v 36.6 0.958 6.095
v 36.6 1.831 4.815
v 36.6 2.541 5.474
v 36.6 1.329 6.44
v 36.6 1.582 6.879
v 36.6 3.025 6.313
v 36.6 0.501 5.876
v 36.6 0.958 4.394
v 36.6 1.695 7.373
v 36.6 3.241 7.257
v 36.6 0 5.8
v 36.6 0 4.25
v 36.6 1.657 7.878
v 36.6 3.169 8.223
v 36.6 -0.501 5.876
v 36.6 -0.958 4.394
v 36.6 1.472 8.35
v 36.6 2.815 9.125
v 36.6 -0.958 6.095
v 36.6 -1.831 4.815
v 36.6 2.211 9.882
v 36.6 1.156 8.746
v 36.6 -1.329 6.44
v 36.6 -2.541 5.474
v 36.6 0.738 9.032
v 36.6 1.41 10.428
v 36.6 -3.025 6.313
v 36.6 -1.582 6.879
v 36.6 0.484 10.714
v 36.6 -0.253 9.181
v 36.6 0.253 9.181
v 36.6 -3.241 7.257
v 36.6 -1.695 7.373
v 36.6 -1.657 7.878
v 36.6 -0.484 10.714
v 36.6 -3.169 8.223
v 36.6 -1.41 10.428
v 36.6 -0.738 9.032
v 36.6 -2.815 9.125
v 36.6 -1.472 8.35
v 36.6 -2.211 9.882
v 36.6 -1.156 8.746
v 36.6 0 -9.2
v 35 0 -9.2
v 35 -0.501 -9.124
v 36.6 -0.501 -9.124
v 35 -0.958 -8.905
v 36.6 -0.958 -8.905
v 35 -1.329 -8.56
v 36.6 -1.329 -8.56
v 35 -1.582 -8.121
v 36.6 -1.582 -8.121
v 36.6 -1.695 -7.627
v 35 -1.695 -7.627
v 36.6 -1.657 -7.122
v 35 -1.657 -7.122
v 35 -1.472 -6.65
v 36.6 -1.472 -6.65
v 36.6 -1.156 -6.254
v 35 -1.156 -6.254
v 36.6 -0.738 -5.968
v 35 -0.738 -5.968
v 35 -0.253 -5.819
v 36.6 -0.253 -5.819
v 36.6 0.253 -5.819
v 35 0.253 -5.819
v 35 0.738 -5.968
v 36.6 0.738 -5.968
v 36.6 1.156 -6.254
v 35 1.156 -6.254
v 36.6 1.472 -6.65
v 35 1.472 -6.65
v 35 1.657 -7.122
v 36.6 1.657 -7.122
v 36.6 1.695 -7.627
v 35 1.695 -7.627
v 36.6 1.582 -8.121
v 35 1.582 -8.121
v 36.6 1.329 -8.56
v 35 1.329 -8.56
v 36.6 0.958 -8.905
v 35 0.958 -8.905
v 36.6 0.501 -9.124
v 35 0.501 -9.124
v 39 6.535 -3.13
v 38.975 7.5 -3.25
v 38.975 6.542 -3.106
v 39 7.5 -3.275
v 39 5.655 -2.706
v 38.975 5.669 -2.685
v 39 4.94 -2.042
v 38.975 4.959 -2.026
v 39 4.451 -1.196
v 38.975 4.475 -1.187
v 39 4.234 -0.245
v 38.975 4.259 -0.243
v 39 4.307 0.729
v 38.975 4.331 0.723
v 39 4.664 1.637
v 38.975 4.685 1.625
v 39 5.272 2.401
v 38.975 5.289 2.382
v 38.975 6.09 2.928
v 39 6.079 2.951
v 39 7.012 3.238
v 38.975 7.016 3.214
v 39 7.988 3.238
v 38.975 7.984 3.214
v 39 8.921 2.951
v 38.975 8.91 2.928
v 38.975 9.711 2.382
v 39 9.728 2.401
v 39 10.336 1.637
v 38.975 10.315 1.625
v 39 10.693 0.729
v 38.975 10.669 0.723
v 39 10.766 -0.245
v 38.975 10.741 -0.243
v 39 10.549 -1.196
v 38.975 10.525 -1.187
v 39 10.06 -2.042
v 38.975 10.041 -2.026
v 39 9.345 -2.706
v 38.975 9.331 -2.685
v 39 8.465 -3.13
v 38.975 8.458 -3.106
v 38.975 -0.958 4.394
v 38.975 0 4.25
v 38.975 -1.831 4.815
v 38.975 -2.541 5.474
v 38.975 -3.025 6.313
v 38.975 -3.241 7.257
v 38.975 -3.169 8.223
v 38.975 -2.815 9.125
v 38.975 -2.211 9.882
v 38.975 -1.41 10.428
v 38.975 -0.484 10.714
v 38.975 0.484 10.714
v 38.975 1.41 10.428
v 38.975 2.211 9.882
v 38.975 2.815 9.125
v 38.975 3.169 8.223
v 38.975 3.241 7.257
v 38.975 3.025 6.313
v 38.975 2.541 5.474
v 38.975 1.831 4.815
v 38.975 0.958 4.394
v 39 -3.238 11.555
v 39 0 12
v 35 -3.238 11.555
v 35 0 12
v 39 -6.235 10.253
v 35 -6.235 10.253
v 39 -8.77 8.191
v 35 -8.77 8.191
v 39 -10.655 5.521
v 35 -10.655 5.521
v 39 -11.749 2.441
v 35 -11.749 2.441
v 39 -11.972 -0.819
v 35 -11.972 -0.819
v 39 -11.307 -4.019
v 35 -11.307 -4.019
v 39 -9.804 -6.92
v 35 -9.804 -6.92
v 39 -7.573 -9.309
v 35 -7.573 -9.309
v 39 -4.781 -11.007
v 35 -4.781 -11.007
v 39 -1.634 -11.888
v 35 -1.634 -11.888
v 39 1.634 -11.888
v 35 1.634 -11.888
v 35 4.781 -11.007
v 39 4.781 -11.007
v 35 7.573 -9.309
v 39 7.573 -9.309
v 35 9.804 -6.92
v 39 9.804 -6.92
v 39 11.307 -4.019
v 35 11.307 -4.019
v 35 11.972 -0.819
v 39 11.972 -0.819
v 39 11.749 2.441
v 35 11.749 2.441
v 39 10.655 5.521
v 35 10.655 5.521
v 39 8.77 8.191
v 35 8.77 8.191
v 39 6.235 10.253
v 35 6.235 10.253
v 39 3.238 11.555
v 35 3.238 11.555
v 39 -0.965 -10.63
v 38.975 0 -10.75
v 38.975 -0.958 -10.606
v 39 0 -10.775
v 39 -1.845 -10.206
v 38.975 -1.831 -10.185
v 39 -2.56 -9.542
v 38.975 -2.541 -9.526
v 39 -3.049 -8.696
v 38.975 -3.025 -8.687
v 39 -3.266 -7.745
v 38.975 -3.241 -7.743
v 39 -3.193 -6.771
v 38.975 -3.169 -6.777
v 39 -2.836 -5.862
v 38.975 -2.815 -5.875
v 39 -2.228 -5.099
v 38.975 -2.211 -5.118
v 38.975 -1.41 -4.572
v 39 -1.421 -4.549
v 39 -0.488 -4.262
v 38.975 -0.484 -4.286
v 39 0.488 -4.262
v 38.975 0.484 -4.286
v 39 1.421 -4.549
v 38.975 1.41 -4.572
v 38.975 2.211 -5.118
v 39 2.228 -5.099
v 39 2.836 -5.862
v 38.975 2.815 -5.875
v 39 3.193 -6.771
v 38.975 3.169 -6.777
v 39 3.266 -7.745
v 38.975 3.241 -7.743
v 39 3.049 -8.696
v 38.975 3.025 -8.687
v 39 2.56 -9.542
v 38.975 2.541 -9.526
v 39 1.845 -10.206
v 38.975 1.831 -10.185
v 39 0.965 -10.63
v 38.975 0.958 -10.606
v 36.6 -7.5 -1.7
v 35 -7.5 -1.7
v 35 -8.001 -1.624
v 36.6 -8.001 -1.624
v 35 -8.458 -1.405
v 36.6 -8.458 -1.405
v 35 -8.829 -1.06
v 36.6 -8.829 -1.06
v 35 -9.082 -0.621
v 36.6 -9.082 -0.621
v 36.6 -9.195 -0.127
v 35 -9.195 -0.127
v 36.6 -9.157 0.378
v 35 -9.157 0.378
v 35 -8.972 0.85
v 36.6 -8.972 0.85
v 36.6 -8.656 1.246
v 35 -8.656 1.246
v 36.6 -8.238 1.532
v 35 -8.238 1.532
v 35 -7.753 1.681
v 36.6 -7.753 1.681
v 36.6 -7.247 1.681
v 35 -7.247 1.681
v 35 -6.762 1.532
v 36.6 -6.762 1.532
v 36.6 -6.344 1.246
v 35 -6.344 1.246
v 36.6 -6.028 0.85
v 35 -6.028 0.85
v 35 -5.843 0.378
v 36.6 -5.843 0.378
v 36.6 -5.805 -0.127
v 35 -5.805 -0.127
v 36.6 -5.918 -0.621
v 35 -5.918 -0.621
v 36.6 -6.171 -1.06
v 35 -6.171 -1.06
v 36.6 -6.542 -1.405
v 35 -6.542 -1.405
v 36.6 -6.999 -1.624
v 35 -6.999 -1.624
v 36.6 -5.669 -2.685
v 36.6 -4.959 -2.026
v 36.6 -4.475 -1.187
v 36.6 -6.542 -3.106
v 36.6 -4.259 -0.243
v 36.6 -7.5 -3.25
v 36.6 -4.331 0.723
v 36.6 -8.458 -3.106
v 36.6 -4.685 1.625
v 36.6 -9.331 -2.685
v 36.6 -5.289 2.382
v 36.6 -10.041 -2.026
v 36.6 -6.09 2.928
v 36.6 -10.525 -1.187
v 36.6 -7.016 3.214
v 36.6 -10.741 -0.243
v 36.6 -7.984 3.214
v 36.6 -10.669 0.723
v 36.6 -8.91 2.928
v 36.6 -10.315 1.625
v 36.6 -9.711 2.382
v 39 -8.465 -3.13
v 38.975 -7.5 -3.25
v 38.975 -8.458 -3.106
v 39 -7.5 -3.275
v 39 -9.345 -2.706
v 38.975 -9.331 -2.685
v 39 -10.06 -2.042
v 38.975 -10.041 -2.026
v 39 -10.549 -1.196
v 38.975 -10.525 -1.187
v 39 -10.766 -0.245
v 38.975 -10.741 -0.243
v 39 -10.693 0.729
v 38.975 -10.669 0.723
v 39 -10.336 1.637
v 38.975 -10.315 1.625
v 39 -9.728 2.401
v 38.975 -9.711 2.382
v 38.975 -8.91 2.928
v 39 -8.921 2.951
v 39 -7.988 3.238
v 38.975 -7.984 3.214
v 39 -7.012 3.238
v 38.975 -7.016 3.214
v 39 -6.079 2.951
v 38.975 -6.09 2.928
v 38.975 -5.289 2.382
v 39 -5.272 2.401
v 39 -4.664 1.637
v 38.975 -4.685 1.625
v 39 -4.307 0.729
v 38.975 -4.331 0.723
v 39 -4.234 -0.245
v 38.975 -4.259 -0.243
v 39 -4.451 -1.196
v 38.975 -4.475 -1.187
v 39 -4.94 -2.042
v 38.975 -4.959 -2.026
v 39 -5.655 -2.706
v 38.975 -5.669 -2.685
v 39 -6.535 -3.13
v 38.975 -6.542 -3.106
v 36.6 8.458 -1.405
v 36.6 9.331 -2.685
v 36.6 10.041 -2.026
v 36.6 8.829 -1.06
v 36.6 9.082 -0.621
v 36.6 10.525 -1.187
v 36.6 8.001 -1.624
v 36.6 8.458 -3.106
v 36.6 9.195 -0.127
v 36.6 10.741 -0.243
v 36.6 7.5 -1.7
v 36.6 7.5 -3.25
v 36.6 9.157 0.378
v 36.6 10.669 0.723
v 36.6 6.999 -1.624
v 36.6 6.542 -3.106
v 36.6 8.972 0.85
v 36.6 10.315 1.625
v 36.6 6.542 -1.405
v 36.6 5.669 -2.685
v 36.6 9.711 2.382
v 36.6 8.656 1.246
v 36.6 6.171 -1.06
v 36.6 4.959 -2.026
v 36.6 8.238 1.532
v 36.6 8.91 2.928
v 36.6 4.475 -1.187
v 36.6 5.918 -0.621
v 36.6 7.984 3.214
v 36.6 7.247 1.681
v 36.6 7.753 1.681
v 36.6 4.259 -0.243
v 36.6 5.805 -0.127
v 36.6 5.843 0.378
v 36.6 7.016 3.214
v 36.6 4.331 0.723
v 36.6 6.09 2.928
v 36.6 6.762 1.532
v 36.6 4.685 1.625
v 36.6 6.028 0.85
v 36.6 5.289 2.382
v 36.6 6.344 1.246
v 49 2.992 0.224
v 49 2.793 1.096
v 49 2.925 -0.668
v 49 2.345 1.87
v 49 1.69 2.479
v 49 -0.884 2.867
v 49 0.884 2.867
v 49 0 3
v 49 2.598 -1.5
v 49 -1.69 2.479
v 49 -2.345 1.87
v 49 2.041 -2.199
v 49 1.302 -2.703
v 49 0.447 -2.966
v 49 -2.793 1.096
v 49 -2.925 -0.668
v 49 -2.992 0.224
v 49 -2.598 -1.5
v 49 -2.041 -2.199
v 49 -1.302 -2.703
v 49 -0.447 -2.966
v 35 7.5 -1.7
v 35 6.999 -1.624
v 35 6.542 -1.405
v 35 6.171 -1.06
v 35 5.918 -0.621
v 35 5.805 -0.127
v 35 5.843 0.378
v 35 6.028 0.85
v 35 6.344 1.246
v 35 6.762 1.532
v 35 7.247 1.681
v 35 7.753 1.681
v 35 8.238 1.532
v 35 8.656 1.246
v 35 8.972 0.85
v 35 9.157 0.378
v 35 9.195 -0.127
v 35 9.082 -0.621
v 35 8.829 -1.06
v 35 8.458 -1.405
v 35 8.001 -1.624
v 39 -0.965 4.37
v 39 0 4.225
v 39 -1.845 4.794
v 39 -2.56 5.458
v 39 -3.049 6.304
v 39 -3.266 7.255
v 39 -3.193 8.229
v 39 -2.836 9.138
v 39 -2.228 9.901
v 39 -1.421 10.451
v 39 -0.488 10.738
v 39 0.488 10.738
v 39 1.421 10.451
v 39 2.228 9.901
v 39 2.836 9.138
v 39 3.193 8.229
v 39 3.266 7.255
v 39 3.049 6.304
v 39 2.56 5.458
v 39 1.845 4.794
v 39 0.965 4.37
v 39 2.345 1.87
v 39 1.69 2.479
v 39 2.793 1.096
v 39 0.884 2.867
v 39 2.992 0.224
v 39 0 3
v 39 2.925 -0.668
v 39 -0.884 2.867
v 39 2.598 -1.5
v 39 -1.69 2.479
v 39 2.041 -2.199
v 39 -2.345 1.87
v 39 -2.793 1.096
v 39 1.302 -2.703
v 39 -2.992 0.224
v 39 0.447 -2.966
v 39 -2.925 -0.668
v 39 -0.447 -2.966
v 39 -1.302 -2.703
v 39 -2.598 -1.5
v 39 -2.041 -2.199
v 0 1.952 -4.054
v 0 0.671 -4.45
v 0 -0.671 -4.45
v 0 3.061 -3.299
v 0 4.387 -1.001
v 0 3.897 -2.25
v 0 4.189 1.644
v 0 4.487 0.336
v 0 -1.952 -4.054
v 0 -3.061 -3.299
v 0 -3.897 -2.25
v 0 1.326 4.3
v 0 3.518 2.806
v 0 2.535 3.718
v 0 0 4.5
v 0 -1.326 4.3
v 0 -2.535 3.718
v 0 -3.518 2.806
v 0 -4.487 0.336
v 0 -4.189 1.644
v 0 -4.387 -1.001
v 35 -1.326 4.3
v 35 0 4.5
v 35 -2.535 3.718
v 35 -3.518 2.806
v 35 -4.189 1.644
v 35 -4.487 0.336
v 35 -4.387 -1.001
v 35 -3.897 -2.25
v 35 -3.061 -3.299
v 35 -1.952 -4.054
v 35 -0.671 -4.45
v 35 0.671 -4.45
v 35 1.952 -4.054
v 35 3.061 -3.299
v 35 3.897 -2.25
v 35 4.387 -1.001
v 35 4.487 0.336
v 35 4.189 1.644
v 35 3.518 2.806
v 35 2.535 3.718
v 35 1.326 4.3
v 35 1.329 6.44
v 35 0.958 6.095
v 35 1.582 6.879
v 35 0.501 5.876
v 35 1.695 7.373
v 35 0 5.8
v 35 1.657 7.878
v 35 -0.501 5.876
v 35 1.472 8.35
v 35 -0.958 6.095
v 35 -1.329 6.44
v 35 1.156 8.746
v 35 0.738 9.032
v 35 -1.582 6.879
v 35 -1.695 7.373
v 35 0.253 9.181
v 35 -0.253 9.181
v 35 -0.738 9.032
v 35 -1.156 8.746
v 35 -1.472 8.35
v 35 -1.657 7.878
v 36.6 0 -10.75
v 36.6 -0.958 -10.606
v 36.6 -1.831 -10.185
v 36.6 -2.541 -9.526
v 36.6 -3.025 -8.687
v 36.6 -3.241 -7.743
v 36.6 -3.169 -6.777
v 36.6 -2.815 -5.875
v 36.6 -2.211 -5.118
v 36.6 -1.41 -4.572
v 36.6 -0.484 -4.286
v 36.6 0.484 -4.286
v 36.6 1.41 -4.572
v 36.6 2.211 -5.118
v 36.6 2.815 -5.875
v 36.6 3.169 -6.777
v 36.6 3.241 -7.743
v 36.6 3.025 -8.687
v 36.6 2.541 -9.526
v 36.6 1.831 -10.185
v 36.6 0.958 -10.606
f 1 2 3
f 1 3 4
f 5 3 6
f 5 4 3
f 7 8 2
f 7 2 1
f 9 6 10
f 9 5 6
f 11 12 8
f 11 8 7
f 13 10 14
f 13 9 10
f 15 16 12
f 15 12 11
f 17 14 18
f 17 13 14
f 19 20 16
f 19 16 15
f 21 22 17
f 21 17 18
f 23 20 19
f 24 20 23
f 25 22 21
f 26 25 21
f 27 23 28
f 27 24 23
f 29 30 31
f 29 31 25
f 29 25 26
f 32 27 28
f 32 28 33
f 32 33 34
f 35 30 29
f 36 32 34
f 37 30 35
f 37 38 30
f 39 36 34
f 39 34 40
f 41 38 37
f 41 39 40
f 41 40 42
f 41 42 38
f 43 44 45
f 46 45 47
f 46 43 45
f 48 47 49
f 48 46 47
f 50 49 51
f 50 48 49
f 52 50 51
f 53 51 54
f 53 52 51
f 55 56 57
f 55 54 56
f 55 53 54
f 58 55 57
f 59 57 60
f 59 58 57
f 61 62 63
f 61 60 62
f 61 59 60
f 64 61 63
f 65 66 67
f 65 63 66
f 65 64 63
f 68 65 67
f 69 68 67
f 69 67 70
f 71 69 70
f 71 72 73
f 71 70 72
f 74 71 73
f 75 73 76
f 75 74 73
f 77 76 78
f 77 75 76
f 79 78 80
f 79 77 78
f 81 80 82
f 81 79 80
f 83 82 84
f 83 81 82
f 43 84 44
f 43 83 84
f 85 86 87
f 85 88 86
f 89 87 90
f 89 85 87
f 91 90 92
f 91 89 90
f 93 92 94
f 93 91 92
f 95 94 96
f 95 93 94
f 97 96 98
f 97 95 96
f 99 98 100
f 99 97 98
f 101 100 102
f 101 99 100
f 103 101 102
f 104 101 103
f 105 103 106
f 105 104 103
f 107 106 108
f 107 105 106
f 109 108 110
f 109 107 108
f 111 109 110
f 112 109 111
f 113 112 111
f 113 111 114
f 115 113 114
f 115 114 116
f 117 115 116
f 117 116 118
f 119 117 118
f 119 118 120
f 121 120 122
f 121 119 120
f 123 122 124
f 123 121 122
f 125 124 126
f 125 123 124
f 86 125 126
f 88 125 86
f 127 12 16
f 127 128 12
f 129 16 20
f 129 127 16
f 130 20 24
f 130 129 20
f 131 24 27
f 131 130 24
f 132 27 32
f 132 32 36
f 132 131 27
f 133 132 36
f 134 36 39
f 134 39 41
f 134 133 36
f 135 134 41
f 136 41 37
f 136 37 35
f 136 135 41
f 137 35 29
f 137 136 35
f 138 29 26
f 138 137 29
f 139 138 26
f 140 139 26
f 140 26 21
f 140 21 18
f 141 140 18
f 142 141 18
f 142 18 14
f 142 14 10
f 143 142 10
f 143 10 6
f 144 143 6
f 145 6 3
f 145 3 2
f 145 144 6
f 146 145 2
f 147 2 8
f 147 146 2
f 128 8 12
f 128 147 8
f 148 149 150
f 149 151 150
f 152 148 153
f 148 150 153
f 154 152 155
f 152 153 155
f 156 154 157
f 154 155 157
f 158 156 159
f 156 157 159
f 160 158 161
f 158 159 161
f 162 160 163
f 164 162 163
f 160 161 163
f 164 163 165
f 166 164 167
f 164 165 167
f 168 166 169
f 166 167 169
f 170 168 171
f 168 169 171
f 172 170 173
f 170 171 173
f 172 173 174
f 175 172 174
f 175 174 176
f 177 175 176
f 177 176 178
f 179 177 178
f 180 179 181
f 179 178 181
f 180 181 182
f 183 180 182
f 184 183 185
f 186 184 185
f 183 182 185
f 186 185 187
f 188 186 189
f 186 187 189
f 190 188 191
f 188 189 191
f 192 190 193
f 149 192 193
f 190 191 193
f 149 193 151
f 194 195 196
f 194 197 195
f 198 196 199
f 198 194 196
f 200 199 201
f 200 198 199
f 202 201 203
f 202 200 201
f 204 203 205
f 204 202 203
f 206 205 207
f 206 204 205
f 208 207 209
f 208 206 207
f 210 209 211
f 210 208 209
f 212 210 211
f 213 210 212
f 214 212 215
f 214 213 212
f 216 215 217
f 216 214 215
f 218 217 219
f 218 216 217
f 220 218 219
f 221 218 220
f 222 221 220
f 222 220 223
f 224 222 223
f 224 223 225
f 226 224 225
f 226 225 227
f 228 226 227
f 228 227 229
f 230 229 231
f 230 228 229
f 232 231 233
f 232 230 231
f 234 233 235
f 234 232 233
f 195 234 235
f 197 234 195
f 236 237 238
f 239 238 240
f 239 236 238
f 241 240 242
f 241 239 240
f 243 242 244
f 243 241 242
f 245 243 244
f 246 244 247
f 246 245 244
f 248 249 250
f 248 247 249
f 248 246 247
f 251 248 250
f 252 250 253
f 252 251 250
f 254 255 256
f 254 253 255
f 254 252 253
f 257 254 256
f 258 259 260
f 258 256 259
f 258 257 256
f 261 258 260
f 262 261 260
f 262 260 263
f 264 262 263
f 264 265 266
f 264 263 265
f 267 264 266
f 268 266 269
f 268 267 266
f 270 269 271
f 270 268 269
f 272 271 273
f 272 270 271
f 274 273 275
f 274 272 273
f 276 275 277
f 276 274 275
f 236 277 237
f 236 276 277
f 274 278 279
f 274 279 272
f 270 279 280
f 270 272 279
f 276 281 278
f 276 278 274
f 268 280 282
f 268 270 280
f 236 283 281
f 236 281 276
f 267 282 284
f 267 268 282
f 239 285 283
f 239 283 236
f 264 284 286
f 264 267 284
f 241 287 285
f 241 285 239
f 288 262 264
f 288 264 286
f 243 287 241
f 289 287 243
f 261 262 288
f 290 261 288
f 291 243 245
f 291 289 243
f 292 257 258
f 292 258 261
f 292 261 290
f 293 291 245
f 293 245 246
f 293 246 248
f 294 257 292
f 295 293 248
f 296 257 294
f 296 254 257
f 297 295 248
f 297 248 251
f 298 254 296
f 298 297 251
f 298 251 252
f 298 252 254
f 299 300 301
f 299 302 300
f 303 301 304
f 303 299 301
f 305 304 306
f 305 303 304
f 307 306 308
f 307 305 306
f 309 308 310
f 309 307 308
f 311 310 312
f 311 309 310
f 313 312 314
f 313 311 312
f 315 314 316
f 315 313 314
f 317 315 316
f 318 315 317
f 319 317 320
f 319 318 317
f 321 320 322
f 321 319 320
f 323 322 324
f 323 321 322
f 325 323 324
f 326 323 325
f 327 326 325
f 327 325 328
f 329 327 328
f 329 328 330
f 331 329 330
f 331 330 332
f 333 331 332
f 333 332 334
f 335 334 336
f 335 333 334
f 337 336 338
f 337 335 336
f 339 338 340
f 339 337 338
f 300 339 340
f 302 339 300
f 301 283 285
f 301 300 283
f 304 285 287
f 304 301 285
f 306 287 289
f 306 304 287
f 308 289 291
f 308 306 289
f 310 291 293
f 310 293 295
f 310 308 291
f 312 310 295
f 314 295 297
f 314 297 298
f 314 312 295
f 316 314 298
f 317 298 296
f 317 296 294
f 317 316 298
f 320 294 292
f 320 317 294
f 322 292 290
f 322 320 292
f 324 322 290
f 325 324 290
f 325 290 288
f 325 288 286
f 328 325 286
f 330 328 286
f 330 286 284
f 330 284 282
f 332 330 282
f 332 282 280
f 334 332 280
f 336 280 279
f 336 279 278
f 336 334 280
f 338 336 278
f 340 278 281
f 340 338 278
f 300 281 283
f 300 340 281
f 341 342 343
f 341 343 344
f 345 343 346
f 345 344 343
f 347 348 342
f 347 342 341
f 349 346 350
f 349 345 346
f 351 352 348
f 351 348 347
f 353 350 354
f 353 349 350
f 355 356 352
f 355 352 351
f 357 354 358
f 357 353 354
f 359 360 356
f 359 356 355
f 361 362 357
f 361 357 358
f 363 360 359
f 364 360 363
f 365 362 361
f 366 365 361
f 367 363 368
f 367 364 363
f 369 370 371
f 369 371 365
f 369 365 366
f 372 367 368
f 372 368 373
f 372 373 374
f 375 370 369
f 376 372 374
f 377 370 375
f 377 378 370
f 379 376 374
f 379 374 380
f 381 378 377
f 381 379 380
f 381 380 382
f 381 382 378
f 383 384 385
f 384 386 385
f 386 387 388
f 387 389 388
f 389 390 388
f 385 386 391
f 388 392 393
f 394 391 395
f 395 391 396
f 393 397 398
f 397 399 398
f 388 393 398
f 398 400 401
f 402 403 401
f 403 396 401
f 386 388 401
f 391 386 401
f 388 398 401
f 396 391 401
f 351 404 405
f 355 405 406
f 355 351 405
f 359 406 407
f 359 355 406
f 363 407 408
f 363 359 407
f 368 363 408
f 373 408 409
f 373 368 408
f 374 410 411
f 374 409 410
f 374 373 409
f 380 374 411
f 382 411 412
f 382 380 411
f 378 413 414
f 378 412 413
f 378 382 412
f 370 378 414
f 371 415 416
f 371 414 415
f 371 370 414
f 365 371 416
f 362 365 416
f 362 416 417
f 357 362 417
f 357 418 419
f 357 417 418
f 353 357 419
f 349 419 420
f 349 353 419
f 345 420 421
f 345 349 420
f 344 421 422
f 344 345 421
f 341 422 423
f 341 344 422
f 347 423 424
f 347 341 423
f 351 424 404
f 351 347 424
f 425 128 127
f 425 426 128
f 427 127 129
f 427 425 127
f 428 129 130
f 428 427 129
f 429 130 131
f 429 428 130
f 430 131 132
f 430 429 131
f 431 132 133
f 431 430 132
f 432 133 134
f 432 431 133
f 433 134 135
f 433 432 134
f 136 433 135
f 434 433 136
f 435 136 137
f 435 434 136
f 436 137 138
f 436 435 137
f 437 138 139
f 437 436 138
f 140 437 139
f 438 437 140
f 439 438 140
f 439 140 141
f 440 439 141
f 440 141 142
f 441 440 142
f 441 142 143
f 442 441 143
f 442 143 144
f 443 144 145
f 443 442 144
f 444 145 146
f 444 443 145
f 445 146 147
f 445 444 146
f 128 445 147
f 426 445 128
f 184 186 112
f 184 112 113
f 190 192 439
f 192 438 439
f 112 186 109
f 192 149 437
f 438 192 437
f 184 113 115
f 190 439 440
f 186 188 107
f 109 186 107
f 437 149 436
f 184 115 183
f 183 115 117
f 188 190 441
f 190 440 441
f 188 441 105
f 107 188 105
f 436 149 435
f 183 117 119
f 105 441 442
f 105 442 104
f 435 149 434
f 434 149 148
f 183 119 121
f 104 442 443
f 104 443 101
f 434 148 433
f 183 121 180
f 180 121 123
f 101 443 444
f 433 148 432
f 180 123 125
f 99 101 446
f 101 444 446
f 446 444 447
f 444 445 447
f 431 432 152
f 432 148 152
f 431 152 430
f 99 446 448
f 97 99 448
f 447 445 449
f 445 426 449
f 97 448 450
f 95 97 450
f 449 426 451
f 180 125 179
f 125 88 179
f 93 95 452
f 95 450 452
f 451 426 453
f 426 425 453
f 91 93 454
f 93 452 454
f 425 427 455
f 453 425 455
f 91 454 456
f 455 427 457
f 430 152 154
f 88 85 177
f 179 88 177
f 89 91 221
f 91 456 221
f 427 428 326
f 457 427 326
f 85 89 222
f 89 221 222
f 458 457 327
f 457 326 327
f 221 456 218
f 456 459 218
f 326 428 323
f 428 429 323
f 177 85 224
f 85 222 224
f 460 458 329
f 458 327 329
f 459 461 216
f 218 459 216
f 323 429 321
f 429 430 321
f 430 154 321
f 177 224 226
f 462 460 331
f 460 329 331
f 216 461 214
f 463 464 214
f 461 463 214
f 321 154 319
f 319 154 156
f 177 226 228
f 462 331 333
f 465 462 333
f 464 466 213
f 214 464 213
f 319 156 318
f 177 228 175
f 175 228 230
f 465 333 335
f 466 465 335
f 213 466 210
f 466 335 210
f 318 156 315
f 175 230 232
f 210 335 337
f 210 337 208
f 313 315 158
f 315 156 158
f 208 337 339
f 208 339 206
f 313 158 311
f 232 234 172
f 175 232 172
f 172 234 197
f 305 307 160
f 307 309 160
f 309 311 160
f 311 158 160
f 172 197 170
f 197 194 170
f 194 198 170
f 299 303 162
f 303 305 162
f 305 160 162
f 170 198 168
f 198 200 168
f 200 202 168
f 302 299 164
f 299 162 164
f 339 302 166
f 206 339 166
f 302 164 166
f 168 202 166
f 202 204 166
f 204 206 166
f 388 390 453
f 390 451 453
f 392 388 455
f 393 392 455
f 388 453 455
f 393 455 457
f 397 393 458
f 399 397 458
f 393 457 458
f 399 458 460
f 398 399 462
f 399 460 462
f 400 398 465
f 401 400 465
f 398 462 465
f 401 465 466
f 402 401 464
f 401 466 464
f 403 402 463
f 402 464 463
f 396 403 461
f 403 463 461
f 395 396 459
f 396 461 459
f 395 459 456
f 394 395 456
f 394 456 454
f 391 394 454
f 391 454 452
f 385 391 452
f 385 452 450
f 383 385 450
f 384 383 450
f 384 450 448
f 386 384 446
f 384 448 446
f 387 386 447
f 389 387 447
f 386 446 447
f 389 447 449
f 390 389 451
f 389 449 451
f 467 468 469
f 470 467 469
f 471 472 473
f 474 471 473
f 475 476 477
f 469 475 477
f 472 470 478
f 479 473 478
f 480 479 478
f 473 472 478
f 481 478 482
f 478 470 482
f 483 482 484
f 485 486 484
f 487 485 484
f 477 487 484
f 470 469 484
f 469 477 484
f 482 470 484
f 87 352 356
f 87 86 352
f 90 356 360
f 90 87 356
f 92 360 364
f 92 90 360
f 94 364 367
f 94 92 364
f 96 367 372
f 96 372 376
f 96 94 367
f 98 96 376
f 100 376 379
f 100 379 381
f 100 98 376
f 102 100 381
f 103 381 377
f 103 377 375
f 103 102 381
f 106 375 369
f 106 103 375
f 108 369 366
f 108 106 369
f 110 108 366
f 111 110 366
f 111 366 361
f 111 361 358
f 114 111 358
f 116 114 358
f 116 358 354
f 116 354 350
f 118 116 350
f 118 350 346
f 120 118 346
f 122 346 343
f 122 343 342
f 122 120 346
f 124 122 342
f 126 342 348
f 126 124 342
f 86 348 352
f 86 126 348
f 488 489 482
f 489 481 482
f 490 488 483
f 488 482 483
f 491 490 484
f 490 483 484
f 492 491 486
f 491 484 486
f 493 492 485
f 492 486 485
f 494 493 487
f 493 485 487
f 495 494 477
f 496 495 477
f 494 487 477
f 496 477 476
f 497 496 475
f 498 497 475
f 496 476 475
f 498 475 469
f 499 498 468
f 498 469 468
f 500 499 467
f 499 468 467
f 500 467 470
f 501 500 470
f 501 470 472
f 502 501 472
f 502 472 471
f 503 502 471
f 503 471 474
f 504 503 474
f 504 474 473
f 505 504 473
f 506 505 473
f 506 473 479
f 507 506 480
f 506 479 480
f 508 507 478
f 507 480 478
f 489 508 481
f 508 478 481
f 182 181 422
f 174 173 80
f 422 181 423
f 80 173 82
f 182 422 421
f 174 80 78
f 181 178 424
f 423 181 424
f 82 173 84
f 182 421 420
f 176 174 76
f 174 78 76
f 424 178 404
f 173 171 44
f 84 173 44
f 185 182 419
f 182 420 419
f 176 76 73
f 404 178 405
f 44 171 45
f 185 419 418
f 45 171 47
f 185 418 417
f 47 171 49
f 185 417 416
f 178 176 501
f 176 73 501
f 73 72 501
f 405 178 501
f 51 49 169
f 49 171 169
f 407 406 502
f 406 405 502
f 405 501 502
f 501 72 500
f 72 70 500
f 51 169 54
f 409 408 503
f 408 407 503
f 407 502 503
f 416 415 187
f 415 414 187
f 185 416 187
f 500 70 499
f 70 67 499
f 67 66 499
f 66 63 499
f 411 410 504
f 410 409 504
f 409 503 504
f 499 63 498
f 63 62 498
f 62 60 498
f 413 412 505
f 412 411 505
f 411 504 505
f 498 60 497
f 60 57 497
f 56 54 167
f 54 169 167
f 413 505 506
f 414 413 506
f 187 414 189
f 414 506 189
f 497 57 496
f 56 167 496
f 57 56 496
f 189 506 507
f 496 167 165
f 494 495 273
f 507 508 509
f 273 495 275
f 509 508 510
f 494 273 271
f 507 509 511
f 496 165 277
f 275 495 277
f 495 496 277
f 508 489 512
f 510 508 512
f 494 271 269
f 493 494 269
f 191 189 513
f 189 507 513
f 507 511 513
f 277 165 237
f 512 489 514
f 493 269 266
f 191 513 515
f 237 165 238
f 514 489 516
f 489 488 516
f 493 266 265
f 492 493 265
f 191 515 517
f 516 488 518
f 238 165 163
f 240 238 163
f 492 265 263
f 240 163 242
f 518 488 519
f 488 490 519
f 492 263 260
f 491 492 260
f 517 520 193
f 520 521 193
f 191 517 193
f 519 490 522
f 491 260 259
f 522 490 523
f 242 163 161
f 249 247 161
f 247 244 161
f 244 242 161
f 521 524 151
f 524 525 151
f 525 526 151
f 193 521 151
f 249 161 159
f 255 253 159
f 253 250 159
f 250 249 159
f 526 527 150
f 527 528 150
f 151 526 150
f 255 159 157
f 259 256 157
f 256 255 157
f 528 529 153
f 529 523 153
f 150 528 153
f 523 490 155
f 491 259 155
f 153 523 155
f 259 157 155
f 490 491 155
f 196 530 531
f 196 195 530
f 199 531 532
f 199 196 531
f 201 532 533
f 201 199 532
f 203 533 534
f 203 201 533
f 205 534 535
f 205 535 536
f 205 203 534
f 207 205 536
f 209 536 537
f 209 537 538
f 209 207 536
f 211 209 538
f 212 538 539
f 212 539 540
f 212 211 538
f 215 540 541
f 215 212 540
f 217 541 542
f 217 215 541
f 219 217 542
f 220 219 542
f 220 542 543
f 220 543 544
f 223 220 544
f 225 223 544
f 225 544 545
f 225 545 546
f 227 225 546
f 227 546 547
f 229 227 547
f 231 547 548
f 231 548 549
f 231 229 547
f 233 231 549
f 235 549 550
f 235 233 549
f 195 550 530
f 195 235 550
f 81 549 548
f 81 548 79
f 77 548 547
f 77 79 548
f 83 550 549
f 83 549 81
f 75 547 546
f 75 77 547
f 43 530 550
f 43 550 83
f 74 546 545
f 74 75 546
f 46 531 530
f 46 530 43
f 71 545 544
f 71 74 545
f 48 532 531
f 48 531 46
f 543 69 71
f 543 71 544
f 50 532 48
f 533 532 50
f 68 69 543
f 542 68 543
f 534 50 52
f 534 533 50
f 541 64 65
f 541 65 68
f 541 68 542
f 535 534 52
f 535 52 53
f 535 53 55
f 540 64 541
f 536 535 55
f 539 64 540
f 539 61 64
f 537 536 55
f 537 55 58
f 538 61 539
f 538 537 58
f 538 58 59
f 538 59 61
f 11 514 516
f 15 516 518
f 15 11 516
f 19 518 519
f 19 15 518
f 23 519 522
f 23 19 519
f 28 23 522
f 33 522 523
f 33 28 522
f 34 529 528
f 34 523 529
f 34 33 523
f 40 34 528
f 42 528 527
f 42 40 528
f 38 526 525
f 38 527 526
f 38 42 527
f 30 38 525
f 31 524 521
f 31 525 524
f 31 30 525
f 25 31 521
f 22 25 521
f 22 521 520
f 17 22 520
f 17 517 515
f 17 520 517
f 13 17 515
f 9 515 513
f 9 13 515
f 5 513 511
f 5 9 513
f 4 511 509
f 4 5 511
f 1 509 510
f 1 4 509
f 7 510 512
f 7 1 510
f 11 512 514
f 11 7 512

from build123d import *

# Parameters (mm, degrees)
CBORE_FOR_M3_HEX_SOCKET_THIN_HEAD_CA_2_COUNT = 2
CBORE_FOR_M3_HEX_SOCKET_THIN_HEAD_CA_2_PITCH = 10.606601718
CBORE_FOR_M3_HEX_SOCKET_THIN_HEAD_CA_3_COUNT = 2
CBORE_FOR_M3_HEX_SOCKET_THIN_HEAD_CA_3_PITCH = 15
CBORE_FOR_M3_HEX_SOCKET_THIN_HEAD_CA_4_COUNT = 2
CBORE_FOR_M3_HEX_SOCKET_THIN_HEAD_CA_4_PITCH = 10.606601718


with BuildPart() as part:
    # Sketch1 → Revolve1 (revolve)
    with BuildSketch(Plane.XY, mode=Mode.PRIVATE) as revolve1_sk:
        Polygon((49, 0), (49, 3), (39, 3), (39, 12), (35, 12), (35, 4.5), (0, 4.5), (0, 0), align=None)
    revolve(revolve1_sk.sketch.rotate(Axis((0, 0, 0), (1, 0, 0)), 90), axis=Axis((0, 0, 0), (1, 0, 0)))

    # Sketch3 → CBORE for M3 Hex Socket Thin Head Cap Screw1 (revolve, cut)
    with BuildSketch(Plane(origin=(39, 0, 7.5), x_dir=(0, 0, -1), z_dir=(0, 1, 0))):
        Polygon((0, 0), (0, 39), (1.7, 39), (1.7, 2.4), (3.25, 2.4), (3.25, 0.025), (3.275, 0), align=None)
    cbore_for_m3_hex_socket_thin_head_cap_sc = revolve(axis=Axis((45.35, 0, 7.5), (-1, 0, 0)), mode=Mode.SUBTRACT)

    # CBORE for M3 Hex Socket Thin Head Ca 2: CBORE for M3 Hex Socket Thin Head Cap Screw1 ×2
    with Locations(*[Vector(0, 0.7071067811865674, -0.7071067811865277) * (i * CBORE_FOR_M3_HEX_SOCKET_THIN_HEAD_CA_2_PITCH) for i in range(1, CBORE_FOR_M3_HEX_SOCKET_THIN_HEAD_CA_2_COUNT)]):
        add(cbore_for_m3_hex_socket_thin_head_cap_sc, mode=Mode.SUBTRACT)

    # CBORE for M3 Hex Socket Thin Head Ca 3: CBORE for M3 Hex Socket Thin Head Cap Screw1 ×2
    with Locations(*[(0, 0, -i * CBORE_FOR_M3_HEX_SOCKET_THIN_HEAD_CA_3_PITCH) for i in range(1, CBORE_FOR_M3_HEX_SOCKET_THIN_HEAD_CA_3_COUNT)]):
        add(cbore_for_m3_hex_socket_thin_head_cap_sc, mode=Mode.SUBTRACT)

    # CBORE for M3 Hex Socket Thin Head Ca 4: CBORE for M3 Hex Socket Thin Head Cap Screw1 ×2
    with Locations(*[Vector(0, -0.7071067811865276, -0.7071067811865674) * (i * CBORE_FOR_M3_HEX_SOCKET_THIN_HEAD_CA_4_PITCH) for i in range(1, CBORE_FOR_M3_HEX_SOCKET_THIN_HEAD_CA_4_COUNT)]):
        add(cbore_for_m3_hex_socket_thin_head_cap_sc, mode=Mode.SUBTRACT)


solid = part.part
